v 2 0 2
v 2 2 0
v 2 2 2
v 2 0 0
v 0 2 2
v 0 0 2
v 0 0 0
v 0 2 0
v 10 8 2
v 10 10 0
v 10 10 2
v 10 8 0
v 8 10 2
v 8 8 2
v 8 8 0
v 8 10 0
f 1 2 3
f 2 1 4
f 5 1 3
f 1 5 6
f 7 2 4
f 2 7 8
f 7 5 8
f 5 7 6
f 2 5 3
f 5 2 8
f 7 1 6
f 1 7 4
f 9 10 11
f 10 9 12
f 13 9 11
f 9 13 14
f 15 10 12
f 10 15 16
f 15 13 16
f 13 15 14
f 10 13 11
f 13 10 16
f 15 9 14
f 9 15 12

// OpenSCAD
union() {
	translate([0, 0, 0]) cube(size=[2,2,2], center=false);
	translate([8, 8, 0]) cube(size=[2,2,2], center=false);
}
